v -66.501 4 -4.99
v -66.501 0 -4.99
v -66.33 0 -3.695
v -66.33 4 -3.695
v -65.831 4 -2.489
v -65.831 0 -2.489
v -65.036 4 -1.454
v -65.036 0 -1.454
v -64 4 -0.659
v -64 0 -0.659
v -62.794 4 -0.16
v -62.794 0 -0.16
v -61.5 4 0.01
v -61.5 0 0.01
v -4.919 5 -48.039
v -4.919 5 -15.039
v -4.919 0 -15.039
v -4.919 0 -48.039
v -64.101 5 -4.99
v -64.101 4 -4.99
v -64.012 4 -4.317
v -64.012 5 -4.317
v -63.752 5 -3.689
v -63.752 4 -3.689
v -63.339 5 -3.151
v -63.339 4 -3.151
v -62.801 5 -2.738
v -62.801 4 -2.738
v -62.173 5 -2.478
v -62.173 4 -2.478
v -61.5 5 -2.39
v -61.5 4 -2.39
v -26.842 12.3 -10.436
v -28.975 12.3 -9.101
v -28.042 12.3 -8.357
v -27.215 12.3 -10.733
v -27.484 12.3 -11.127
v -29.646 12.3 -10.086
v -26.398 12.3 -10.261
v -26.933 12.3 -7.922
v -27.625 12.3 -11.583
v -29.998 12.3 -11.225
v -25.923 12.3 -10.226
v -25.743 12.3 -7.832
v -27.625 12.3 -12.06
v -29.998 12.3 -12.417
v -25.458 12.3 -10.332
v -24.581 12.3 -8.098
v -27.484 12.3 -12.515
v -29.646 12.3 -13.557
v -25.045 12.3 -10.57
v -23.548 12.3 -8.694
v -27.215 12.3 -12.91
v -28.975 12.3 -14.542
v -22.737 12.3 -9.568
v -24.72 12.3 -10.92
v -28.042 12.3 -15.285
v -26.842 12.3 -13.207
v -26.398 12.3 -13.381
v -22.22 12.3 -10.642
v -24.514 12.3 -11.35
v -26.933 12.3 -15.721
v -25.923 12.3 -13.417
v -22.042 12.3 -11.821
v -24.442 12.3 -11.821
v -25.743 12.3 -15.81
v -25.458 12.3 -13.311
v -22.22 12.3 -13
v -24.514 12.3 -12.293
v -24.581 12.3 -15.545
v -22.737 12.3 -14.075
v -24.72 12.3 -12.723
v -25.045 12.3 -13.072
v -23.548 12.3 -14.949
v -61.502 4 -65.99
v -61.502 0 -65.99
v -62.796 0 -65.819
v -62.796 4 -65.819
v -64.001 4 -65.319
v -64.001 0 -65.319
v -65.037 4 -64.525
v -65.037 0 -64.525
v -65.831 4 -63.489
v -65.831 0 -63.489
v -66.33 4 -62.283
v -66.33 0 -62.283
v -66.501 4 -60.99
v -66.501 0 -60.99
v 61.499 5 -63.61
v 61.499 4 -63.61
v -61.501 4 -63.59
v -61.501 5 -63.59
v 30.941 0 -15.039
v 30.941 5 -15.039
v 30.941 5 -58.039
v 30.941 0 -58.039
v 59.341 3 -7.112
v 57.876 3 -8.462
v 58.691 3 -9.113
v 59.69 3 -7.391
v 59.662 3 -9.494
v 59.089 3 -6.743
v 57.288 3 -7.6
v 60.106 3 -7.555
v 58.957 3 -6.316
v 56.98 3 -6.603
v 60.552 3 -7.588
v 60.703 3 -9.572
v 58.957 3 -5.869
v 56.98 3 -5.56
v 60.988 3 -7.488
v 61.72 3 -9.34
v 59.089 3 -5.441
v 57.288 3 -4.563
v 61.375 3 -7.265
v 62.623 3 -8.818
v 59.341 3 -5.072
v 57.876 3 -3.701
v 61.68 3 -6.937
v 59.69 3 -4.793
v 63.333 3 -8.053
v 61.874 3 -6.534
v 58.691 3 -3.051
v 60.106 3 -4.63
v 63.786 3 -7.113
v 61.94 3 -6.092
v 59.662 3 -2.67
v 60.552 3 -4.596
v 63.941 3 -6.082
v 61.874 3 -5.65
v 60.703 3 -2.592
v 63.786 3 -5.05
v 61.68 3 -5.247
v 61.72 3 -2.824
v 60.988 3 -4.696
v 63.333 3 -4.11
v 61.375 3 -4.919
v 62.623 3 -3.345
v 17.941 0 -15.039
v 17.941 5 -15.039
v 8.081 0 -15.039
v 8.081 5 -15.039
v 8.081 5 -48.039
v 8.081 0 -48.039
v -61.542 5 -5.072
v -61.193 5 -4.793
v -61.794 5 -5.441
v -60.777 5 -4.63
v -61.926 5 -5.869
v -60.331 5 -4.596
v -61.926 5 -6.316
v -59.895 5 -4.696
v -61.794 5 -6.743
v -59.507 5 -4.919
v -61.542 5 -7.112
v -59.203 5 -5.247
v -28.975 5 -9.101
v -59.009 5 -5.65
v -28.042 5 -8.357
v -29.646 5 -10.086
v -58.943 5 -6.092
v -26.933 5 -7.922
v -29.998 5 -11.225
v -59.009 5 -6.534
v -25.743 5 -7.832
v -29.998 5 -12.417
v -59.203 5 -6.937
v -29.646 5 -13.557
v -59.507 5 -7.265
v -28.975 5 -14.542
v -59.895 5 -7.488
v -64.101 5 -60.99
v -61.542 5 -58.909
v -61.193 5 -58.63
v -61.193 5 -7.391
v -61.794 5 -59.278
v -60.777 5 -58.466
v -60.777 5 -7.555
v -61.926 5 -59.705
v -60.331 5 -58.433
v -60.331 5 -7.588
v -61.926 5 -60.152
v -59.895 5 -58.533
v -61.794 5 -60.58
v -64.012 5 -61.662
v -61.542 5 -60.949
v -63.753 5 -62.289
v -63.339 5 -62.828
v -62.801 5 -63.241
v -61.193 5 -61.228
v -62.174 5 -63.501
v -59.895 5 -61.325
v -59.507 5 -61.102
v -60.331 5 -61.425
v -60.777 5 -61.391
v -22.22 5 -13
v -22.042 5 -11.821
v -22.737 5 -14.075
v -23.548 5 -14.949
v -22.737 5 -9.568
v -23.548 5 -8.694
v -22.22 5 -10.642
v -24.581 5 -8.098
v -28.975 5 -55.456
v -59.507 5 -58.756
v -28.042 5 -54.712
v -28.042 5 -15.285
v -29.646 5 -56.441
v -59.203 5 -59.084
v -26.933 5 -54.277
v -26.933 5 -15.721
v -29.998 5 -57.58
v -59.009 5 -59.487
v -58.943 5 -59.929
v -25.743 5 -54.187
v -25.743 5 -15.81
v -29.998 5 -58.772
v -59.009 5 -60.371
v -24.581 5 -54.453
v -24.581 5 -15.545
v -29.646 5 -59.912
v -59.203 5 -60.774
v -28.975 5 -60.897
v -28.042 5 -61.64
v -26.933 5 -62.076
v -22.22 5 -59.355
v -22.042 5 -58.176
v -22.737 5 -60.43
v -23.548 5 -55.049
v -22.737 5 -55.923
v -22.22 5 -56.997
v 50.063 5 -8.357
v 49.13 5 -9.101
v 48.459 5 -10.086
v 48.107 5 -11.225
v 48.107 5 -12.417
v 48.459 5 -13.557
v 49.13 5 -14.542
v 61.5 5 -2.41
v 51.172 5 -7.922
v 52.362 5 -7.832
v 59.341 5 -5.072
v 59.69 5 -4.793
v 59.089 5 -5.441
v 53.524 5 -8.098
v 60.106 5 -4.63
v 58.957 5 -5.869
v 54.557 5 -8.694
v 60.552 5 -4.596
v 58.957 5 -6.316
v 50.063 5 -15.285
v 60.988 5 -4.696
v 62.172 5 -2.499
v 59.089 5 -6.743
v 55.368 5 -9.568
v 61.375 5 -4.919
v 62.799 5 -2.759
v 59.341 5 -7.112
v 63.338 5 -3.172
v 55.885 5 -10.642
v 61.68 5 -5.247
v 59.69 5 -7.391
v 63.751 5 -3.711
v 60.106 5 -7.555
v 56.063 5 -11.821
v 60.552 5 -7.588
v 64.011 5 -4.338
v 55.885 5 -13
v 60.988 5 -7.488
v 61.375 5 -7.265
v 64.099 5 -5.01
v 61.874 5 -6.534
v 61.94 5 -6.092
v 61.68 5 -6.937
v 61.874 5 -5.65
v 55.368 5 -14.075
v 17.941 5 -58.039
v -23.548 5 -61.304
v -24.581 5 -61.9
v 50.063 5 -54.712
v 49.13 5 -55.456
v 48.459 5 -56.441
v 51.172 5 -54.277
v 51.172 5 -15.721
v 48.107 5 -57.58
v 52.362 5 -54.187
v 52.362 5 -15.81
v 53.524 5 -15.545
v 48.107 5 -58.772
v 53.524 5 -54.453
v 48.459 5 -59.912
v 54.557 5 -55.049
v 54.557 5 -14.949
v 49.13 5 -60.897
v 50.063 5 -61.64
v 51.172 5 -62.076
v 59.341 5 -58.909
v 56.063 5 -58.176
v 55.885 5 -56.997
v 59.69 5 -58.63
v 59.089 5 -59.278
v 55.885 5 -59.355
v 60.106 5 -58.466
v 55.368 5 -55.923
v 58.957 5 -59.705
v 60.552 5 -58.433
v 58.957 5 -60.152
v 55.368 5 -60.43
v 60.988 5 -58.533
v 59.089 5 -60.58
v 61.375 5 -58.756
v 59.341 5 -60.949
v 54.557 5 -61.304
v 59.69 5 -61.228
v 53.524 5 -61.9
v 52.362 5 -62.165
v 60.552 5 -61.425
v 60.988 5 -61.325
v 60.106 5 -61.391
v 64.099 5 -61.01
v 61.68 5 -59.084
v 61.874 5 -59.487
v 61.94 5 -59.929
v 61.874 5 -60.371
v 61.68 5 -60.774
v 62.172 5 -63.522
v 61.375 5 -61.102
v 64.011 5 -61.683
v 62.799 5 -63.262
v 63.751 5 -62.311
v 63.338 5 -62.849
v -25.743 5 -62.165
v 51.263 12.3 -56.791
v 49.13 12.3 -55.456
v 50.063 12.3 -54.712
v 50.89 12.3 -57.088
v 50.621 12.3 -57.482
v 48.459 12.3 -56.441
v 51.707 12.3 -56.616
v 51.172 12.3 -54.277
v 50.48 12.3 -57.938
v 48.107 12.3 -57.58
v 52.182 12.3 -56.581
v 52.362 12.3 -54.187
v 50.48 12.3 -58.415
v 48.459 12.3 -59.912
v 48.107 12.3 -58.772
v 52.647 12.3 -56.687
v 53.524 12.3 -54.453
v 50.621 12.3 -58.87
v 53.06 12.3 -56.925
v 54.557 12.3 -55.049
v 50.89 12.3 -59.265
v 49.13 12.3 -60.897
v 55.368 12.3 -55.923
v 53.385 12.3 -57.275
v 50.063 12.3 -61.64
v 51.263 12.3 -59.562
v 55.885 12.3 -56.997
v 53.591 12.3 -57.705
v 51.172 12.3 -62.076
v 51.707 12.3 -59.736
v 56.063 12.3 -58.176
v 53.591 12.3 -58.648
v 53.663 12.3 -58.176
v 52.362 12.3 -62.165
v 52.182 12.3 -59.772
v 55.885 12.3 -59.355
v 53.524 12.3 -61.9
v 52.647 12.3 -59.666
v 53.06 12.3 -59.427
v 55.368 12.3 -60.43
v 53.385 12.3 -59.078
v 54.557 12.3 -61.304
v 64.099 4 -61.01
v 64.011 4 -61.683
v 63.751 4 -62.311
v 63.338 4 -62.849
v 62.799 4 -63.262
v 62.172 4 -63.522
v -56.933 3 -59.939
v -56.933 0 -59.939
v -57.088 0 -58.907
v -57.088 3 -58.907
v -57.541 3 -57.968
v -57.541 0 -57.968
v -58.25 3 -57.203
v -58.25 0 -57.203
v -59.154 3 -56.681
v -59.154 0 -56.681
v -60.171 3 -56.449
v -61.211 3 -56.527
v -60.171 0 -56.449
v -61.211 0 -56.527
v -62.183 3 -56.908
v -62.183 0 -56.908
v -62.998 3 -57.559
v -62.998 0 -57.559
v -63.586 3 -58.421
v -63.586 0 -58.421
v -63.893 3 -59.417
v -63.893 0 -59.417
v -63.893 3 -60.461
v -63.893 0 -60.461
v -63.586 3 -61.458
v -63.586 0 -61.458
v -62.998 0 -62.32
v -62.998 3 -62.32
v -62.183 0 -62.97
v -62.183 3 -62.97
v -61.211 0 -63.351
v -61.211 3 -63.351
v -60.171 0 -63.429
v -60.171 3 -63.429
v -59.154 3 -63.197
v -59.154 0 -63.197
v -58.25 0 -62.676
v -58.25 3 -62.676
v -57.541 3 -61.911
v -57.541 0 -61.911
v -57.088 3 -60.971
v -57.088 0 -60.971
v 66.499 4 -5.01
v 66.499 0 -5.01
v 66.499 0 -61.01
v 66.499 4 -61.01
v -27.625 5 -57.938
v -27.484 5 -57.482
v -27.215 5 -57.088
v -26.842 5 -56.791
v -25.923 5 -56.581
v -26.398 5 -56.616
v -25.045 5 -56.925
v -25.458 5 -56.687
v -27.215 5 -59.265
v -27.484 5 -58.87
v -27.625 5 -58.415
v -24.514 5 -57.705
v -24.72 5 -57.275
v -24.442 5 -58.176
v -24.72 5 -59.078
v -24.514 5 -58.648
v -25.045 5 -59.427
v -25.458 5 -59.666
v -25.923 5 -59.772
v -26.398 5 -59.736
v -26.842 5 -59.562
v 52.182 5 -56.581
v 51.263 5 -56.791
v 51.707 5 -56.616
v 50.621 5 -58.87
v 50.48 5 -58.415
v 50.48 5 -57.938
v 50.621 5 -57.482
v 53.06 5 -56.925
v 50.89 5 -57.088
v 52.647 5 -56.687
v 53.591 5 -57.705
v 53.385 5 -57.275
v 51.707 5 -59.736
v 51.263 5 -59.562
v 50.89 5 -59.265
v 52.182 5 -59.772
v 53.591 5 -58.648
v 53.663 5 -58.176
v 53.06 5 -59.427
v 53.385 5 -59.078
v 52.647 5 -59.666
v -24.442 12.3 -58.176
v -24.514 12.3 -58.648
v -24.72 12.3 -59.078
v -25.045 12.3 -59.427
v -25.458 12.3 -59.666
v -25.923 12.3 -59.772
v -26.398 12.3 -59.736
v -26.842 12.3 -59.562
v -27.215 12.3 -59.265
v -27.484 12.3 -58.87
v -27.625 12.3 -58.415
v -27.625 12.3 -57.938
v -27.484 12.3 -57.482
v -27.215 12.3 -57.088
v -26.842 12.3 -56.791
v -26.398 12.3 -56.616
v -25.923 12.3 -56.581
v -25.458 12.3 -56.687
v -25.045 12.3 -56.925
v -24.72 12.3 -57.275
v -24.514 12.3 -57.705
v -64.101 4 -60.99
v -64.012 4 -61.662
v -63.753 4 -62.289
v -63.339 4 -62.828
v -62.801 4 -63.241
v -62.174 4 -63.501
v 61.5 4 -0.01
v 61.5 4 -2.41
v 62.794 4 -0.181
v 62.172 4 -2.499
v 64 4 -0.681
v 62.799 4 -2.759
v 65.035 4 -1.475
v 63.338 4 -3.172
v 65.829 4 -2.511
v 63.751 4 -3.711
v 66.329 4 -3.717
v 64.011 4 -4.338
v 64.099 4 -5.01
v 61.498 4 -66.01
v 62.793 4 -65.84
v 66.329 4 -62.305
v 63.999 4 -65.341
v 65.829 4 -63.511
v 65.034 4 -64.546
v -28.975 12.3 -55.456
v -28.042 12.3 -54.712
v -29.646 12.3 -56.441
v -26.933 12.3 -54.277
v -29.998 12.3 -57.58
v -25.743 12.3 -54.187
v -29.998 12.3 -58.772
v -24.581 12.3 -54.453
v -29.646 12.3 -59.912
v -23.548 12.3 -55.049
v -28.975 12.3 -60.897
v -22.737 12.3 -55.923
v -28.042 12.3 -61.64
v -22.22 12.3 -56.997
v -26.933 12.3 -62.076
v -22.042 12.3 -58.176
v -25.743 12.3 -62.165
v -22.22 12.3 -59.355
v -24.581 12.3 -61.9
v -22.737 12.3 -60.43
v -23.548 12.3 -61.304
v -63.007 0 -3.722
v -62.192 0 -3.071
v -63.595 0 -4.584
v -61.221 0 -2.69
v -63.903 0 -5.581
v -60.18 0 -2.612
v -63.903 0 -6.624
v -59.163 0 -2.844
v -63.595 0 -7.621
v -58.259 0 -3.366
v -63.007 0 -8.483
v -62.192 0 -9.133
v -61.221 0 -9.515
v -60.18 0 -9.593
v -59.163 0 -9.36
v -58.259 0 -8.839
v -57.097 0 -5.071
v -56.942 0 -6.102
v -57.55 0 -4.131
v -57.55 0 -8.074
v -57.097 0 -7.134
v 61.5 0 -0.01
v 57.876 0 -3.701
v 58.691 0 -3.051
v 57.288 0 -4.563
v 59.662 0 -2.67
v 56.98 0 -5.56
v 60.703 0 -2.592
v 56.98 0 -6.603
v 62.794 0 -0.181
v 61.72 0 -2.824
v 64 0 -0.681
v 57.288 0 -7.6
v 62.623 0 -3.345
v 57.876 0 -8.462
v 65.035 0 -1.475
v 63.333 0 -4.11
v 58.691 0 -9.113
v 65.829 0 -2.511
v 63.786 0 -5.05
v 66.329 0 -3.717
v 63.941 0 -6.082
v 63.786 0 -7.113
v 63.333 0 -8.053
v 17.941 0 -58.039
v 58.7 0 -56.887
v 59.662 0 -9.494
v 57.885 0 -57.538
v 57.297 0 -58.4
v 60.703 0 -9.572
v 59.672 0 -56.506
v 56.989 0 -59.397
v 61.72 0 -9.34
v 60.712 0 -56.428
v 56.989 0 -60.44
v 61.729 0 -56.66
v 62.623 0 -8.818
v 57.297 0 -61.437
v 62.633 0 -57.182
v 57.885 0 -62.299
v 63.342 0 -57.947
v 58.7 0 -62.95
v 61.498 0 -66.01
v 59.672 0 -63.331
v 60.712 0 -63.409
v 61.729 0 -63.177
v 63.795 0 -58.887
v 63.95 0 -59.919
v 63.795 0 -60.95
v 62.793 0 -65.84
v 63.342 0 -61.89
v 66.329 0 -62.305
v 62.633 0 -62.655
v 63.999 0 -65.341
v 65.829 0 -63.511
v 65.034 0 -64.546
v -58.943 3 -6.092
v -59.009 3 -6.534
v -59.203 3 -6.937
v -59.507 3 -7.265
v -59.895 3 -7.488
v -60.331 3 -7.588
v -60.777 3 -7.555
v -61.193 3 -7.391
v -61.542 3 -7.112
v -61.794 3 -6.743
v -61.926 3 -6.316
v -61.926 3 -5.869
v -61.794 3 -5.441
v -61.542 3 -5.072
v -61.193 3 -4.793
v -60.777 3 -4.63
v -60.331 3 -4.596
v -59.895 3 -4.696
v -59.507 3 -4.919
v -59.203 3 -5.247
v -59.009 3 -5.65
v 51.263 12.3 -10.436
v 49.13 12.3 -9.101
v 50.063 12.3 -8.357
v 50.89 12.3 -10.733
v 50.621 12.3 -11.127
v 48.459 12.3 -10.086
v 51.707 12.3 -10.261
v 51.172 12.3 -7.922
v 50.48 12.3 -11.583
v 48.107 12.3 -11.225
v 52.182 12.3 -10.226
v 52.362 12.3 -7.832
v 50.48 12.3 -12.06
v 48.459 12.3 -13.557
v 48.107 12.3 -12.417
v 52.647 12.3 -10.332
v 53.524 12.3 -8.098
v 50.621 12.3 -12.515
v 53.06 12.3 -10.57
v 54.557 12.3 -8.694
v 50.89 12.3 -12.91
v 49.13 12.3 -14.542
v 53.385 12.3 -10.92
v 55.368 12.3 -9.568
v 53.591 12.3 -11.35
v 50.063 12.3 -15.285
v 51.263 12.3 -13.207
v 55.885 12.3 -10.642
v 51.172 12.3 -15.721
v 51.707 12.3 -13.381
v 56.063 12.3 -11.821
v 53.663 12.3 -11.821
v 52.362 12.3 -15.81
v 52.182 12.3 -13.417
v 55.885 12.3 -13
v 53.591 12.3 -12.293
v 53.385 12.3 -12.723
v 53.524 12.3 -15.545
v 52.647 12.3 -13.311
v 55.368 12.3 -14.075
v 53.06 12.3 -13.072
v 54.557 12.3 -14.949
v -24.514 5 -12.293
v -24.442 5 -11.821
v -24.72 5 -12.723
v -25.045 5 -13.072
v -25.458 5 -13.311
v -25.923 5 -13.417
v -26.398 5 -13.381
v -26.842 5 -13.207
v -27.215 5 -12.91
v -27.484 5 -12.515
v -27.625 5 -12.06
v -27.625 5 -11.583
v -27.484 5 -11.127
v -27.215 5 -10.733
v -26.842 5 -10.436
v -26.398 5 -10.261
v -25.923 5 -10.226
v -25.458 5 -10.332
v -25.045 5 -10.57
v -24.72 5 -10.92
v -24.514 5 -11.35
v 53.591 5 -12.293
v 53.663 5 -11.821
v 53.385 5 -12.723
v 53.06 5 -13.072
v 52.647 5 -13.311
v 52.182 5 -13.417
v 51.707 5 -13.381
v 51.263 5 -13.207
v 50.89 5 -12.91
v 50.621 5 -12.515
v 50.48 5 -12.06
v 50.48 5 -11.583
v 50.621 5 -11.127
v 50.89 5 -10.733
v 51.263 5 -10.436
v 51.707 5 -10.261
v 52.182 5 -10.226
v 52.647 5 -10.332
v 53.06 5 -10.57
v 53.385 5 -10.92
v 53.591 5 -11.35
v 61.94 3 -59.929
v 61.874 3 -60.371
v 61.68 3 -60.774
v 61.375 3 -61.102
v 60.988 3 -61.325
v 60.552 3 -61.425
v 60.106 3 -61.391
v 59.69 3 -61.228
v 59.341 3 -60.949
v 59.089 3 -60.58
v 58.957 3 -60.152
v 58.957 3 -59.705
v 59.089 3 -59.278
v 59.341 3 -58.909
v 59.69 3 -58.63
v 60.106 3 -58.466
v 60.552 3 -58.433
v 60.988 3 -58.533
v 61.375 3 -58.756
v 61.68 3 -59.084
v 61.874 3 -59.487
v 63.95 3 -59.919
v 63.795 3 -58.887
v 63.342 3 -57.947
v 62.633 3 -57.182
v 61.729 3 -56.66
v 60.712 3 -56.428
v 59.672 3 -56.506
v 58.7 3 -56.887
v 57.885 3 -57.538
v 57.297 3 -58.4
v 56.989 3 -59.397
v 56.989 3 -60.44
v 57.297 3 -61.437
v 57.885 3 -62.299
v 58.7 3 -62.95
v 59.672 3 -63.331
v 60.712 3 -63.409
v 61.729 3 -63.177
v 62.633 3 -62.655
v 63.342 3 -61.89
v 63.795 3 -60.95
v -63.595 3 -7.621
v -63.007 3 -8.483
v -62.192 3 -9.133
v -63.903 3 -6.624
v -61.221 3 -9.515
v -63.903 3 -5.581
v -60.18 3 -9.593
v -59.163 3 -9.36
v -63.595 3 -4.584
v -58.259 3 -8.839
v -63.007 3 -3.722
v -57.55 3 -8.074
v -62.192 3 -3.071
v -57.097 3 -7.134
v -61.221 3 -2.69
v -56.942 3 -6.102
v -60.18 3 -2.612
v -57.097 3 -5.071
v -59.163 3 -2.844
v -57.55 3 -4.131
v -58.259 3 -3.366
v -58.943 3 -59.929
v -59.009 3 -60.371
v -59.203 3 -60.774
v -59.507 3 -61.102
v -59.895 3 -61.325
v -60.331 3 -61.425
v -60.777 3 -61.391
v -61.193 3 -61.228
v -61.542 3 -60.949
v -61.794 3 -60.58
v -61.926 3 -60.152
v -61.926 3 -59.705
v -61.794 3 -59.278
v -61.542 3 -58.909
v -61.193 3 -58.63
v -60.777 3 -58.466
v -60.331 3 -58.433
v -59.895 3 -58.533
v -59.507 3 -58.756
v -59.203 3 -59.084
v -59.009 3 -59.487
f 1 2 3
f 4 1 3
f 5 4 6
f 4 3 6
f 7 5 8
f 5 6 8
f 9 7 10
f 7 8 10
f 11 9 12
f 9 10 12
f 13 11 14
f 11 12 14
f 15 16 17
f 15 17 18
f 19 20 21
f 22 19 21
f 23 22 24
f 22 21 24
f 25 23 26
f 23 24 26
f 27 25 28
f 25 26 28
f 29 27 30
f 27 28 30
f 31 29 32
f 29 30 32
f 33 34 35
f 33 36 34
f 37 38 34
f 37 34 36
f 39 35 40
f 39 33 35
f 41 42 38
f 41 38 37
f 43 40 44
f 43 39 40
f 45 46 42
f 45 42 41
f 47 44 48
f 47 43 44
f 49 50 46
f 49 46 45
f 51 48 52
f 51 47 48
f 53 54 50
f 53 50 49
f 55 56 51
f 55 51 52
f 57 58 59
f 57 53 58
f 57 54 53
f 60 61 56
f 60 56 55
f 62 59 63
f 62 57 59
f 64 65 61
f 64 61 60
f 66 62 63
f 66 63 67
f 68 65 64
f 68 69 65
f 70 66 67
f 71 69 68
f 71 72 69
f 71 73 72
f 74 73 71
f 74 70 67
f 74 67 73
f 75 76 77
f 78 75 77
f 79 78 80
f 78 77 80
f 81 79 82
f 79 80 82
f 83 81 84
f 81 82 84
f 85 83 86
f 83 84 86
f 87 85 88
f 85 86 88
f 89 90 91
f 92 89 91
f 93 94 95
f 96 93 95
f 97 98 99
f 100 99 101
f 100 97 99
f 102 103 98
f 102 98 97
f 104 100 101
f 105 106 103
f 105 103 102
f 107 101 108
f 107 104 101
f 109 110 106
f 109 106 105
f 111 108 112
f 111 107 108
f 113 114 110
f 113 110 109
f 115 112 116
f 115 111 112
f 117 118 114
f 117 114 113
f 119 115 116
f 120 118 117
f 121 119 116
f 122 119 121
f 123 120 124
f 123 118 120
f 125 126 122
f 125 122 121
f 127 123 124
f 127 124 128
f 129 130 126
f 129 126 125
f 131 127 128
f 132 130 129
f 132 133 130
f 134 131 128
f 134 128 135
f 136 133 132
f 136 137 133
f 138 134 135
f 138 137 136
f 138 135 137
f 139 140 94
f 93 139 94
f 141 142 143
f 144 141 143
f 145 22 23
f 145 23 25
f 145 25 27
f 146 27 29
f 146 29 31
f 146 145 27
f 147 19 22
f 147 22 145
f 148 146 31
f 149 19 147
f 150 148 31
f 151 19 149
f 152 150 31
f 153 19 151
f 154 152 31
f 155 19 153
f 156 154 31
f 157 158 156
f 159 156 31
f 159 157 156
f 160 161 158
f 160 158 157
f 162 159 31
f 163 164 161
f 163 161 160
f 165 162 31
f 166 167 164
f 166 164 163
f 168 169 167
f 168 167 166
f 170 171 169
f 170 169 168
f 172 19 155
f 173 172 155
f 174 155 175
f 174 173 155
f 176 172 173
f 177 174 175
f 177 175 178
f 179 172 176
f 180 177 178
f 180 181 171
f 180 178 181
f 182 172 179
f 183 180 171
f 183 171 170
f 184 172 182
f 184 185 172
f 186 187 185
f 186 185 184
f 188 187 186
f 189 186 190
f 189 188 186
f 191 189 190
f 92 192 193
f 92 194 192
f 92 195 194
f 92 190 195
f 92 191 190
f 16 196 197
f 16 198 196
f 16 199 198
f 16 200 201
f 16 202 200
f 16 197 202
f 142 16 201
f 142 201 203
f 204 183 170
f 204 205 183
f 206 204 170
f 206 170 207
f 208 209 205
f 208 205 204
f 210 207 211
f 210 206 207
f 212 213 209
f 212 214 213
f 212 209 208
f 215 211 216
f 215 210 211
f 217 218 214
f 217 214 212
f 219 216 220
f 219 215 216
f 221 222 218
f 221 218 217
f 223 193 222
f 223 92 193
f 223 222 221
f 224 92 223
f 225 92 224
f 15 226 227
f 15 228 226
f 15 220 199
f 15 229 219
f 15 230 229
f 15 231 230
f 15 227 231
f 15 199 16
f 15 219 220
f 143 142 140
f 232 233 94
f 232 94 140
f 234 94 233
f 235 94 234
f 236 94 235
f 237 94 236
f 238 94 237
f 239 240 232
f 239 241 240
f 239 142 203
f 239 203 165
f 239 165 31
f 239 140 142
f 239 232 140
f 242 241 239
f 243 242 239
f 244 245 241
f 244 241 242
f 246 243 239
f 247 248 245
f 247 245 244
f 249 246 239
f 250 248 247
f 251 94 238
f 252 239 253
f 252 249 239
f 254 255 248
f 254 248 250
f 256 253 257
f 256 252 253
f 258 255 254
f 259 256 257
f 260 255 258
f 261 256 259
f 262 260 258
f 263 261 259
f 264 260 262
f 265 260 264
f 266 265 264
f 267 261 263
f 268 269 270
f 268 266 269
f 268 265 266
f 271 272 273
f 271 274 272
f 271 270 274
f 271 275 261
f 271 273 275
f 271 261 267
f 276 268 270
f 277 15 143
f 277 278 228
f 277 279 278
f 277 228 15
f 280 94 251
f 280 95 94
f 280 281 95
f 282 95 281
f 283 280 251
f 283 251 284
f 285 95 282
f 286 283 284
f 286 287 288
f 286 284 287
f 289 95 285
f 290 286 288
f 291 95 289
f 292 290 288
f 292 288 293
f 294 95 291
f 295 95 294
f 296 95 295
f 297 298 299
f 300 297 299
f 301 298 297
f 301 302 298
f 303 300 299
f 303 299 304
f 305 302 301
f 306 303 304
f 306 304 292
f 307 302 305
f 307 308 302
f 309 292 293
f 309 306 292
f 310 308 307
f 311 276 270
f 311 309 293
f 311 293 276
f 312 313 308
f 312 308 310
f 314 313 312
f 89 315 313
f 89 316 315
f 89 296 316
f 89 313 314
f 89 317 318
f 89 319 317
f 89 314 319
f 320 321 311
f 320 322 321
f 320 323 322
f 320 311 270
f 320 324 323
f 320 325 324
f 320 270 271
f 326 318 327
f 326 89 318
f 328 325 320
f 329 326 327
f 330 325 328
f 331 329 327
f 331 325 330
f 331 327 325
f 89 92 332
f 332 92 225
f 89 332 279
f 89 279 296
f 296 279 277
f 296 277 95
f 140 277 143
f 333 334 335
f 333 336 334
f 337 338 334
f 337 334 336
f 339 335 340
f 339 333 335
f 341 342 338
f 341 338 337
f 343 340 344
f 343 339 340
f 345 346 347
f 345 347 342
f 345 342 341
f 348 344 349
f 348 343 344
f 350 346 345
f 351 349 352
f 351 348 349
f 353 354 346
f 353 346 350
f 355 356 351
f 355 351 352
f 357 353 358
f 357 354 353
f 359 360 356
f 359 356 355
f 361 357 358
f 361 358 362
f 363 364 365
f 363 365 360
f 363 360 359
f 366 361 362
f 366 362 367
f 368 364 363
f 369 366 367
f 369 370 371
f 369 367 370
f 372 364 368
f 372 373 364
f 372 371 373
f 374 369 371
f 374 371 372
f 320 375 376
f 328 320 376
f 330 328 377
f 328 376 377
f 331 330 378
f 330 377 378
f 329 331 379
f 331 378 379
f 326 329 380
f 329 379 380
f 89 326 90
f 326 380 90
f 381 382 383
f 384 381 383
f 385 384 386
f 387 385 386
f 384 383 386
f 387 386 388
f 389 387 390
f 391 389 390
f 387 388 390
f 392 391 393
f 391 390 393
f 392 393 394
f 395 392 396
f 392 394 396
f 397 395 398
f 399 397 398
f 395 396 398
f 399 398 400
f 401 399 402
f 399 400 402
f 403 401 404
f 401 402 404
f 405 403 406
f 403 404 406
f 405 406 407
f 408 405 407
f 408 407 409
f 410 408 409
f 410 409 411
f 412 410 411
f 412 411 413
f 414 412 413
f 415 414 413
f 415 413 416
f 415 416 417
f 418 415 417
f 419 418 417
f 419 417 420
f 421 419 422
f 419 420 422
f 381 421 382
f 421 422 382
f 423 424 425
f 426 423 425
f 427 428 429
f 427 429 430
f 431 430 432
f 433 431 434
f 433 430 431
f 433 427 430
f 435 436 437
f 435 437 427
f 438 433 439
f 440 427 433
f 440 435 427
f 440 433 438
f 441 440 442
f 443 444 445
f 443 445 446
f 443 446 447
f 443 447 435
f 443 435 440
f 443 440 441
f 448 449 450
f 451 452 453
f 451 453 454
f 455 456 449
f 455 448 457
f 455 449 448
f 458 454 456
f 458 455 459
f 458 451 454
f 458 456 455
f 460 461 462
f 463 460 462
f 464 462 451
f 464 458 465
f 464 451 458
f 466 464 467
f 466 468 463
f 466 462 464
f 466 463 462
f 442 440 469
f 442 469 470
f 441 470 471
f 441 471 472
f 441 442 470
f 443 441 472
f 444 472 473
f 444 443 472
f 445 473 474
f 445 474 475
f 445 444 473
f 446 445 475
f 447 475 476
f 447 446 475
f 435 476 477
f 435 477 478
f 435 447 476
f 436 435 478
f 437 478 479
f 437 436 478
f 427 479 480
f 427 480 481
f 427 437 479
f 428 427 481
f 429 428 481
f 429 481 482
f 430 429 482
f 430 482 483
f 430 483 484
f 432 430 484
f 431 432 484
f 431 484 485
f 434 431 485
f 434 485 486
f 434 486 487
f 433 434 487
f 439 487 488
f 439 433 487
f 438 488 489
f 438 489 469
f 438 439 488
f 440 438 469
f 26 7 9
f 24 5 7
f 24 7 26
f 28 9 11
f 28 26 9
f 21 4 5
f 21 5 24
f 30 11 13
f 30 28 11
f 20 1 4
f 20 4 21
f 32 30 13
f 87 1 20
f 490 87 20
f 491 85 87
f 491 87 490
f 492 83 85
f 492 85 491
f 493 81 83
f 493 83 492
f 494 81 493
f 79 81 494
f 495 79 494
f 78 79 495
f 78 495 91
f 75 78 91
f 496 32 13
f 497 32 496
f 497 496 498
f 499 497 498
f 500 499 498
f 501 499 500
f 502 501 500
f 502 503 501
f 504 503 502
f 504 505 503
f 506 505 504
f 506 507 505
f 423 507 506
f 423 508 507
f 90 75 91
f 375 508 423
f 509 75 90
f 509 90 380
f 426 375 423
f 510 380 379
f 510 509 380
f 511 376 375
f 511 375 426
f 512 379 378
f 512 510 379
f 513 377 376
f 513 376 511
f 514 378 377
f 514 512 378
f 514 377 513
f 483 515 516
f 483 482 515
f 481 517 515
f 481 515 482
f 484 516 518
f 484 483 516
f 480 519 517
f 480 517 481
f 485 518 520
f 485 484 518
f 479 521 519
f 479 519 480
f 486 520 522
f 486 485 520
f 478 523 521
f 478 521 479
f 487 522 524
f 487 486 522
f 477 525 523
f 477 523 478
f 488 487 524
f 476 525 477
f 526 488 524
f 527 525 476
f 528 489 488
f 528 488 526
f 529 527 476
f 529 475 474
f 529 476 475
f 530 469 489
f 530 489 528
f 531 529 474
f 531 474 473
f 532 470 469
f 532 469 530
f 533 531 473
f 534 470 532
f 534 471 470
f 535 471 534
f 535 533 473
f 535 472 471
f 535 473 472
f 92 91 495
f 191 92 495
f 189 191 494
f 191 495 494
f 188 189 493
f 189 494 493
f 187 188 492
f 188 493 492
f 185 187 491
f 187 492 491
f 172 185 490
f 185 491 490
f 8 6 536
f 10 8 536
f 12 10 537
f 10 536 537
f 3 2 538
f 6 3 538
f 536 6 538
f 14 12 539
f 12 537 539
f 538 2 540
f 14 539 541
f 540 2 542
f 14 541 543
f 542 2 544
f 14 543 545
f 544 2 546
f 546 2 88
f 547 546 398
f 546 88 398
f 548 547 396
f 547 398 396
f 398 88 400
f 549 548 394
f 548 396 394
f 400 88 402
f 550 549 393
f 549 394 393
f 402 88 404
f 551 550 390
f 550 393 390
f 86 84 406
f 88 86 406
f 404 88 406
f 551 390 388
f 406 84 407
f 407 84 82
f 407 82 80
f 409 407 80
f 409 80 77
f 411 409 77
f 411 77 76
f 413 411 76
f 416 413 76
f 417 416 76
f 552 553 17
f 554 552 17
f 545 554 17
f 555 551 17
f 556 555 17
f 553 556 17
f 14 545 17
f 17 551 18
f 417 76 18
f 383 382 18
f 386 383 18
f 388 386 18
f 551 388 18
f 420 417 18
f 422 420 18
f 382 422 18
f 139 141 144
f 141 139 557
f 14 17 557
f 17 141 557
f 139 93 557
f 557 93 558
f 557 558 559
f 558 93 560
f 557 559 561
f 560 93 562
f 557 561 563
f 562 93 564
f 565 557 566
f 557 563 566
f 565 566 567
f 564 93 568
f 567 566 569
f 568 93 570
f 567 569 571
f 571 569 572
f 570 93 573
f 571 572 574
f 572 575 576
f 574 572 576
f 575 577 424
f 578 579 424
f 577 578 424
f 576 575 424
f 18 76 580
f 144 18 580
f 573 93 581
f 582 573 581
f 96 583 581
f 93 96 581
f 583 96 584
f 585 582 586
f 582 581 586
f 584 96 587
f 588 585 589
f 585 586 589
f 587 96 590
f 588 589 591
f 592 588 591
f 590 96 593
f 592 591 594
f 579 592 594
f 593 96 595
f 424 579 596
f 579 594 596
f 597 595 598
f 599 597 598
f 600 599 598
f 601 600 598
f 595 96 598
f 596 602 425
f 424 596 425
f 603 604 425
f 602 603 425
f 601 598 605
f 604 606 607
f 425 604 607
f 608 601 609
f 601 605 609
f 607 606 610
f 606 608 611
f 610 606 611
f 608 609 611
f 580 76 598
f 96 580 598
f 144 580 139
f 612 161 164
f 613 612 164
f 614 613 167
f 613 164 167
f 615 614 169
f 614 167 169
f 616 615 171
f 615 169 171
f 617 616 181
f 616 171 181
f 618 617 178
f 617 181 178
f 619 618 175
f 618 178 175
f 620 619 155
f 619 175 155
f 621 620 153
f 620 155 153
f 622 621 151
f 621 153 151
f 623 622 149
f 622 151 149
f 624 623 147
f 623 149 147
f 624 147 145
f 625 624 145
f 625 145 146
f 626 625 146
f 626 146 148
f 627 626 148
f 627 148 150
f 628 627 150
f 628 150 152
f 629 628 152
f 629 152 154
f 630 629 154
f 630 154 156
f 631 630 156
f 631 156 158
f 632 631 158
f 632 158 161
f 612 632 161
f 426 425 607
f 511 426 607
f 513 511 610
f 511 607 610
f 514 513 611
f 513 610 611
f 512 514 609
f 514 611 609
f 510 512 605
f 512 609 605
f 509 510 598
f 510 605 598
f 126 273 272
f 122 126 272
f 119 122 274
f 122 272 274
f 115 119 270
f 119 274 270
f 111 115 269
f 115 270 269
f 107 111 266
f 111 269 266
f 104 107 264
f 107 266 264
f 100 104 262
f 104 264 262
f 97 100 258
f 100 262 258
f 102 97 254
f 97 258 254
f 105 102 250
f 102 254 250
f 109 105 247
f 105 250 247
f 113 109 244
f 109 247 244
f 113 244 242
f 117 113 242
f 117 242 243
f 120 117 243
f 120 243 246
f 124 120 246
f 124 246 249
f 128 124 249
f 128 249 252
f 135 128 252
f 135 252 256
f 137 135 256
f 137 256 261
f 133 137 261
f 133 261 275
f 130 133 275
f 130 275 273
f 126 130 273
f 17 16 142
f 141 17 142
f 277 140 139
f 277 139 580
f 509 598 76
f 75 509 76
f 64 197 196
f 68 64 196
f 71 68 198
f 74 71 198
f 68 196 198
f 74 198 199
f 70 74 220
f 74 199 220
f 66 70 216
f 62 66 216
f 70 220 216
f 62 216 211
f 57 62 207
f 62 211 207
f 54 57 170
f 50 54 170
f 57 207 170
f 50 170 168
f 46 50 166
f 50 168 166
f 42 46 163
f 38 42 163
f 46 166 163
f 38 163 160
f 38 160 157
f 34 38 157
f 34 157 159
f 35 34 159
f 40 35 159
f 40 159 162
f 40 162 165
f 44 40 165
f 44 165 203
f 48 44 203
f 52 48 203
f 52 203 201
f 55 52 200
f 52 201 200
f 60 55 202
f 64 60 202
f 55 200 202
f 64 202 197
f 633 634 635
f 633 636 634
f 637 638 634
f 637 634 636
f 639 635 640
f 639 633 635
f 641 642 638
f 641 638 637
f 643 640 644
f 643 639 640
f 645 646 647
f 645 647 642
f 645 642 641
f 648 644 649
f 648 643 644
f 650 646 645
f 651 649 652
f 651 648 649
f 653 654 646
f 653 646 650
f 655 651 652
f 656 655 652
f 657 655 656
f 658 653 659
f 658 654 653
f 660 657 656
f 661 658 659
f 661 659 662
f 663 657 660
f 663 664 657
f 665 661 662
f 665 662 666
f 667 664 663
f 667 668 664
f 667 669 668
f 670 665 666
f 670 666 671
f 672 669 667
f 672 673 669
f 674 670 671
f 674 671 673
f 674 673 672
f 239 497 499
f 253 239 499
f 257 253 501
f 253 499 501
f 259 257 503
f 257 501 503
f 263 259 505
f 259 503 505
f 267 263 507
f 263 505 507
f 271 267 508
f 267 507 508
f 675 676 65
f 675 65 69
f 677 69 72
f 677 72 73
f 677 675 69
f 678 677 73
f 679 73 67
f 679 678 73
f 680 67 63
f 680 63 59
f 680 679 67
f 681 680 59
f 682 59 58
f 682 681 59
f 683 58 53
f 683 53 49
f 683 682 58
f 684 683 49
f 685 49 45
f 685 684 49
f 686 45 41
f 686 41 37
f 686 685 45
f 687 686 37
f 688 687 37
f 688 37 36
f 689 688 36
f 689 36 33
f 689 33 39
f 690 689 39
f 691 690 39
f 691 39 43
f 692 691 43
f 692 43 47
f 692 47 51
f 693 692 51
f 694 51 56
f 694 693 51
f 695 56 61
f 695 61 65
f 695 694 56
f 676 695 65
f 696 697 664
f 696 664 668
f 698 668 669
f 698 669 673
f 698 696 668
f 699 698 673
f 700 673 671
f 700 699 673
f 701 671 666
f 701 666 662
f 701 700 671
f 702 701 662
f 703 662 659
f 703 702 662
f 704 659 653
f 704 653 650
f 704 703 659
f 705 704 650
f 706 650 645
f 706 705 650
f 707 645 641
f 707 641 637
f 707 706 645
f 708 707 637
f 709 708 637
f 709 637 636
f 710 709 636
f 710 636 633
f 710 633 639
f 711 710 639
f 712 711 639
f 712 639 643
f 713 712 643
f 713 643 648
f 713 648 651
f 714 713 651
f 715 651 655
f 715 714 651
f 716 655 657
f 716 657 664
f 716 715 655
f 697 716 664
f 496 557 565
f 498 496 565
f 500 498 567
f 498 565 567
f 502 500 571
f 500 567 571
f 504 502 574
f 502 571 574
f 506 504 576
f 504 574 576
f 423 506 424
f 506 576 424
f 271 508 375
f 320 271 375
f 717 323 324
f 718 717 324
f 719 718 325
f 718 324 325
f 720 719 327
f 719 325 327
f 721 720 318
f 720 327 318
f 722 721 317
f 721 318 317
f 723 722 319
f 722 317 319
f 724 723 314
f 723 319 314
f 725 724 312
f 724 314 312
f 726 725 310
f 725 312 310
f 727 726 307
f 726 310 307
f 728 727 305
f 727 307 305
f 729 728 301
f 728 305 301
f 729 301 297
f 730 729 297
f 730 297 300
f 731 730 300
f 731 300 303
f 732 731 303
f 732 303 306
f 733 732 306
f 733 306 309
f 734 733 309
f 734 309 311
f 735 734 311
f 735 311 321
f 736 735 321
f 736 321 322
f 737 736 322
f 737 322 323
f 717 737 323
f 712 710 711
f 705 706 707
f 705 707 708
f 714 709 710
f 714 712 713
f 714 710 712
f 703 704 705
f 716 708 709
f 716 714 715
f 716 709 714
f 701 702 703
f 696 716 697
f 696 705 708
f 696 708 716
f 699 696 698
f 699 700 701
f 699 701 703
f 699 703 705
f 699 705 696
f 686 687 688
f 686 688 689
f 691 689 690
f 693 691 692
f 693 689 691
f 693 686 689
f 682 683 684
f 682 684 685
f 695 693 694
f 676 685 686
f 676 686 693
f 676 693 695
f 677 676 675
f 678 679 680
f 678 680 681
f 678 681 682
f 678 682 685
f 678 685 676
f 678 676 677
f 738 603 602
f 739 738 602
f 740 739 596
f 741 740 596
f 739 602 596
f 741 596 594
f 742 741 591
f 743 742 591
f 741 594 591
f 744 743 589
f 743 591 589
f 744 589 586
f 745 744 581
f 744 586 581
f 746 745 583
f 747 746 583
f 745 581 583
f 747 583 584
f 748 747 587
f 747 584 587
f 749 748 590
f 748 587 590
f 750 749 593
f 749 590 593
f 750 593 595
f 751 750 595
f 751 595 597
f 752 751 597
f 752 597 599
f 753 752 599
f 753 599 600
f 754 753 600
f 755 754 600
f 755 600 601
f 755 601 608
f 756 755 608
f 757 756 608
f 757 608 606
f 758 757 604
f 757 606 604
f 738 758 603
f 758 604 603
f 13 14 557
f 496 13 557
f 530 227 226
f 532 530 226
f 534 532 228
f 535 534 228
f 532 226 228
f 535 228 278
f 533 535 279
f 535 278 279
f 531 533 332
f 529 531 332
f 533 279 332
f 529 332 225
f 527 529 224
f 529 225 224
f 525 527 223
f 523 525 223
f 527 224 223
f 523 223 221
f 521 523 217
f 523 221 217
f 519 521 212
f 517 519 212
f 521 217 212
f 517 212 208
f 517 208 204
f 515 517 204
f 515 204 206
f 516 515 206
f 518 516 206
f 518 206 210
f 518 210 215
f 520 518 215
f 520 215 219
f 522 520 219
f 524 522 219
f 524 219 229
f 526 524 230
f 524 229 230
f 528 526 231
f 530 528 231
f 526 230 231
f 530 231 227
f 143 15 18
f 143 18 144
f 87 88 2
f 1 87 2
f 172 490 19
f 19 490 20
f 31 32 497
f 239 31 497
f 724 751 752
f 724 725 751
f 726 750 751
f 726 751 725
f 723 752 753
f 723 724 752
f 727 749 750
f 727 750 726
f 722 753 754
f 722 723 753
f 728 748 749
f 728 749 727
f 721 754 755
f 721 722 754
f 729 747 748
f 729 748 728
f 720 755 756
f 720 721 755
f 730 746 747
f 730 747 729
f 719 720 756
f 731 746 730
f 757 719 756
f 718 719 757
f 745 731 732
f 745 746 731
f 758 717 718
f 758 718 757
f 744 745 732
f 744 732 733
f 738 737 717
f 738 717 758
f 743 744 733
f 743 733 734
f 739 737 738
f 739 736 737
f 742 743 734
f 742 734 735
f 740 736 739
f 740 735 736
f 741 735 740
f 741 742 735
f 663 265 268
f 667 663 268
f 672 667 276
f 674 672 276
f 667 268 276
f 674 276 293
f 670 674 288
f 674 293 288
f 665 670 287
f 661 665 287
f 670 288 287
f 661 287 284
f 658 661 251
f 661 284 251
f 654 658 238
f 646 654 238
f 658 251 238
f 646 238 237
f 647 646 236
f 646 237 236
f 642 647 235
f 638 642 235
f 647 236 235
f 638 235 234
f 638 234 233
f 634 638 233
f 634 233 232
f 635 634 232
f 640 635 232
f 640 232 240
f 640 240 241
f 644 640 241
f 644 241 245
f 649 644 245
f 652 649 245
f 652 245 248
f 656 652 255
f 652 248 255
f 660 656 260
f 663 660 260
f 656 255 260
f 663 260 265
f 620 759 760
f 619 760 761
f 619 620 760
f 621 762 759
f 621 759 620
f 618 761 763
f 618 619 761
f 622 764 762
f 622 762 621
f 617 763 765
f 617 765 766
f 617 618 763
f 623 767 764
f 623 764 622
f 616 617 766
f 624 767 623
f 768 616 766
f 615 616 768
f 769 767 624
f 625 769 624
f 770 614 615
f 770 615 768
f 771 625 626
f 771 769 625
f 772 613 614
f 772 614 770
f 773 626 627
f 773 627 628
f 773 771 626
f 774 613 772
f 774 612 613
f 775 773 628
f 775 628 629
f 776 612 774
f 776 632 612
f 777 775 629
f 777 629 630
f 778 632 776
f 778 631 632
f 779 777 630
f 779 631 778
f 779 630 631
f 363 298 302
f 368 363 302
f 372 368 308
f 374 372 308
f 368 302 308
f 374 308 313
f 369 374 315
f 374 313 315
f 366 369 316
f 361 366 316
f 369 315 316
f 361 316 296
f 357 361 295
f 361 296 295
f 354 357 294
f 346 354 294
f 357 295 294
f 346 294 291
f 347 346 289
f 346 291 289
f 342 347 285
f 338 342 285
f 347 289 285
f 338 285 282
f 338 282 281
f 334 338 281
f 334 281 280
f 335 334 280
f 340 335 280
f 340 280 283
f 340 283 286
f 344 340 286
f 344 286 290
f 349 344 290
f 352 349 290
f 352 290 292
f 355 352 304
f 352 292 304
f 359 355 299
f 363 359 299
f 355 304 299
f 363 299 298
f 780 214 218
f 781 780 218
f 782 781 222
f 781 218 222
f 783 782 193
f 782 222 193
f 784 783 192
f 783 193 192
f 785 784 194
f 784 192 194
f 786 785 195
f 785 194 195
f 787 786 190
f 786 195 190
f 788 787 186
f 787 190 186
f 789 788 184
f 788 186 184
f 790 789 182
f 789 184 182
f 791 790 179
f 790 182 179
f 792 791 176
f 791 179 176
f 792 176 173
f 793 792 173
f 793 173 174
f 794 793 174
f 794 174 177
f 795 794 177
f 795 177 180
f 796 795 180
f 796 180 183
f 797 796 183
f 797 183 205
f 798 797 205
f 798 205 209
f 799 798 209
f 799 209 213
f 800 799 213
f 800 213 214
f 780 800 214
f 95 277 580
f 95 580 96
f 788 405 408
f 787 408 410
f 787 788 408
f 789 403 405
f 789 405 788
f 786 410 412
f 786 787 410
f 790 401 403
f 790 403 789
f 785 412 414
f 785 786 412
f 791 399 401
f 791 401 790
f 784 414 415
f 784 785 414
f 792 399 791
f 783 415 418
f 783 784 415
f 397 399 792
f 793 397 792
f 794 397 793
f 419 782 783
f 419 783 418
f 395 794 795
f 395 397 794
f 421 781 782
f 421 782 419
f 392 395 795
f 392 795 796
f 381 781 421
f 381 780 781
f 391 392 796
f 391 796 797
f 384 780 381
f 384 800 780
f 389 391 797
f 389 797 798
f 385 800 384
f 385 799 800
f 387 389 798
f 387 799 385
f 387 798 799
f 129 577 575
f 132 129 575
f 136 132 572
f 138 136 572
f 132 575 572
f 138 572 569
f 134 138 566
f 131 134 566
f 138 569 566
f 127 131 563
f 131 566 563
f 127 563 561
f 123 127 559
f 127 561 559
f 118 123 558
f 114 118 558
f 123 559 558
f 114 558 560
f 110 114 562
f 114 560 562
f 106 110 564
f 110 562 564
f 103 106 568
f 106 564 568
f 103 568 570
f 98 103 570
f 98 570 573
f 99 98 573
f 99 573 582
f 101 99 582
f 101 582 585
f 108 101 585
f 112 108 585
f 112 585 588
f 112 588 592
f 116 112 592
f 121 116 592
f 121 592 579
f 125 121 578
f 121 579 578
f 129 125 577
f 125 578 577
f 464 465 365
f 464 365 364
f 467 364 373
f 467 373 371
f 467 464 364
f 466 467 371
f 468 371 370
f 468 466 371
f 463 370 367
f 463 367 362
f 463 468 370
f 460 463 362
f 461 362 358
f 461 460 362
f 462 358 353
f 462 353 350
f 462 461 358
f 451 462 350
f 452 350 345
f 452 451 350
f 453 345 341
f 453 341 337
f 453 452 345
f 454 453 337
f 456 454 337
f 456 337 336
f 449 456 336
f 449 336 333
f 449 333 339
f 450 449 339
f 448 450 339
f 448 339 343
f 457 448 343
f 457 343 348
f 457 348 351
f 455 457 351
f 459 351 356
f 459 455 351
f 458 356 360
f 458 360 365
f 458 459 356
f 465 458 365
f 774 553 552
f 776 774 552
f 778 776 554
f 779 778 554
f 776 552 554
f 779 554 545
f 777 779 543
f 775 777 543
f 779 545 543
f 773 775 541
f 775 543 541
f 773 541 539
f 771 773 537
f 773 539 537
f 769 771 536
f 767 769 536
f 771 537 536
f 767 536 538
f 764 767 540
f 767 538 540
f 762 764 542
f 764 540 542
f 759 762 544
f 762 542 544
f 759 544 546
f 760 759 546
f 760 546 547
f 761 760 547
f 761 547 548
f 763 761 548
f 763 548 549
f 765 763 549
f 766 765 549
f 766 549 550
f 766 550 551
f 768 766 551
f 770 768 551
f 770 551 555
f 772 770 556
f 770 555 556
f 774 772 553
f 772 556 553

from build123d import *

# Parameters (mm, degrees)
EXTRUDE_1_DEPTH     = 4
EXTRUDE_2_DEPTH     = 1
SKETCH_3_W          = 13
SKETCH_3_H          = 43
SKETCH_3_H_2        = 33
CUT_EXTRUDE_1_DEPTH = 6
SKETCH_4_R          = 4
SKETCH_4_R_2        = 1.6
EXTRUDE_4_DEPTH     = 7.3
SKETCH_5_R          = 1.5
CUT_EXTRUDE_2_DEPTH = 7.3
SKETCH_6_R          = 3.5
CUT_EXTRUDE_3_DEPTH = 3


with BuildPart() as part:
    # 스케치1 → 보스-돌출1 (new body)
    with BuildSketch(Plane(origin=(0, 0, 0), x_dir=(1, 0, 0), z_dir=(0, 1, 0))):
        with BuildLine():
            Line((61.498388188, 66.010476517), (-61.501611812, 65.989522963))
            ThreePointArc((-61.501611812, 65.989522963), (-65.036624731, 64.524771992), (-66.500805906, 60.989523028))
            Line((-66.500805906, 60.989523028), (-66.500805906, 4.989523158))
            ThreePointArc((-66.500805906, 4.989523158), (-65.03605487, 1.453704333), (-61.5, -0.010476777))
            Line((-61.5, -0.010476777), (61.5, 0.010476777))
            ThreePointArc((61.5, 0.010476777), (65.035012919, 1.475227749), (66.499194094, 5.010476712))
            Line((66.499194094, 5.010476712), (66.499194094, 61.010476582))
            ThreePointArc((66.499194094, 61.010476582), (65.034443058, 64.546295408), (61.498388188, 66.010476517))
        make_face()
    extrude(amount=EXTRUDE_1_DEPTH)

    # 스케치2 → 보스-돌출2 (add)
    with BuildSketch(Plane(origin=(0, 4, 0), x_dir=(1, 0, 0), z_dir=(0, 1, 0))):
        with BuildLine():
            Line((61.498751287, 63.610473876), (-61.501248713, 63.589525677))
            ThreePointArc((-61.501248713, 63.589525677), (-63.339440086, 62.827846783), (-64.100805906, 60.989525714))
            Line((-64.100805906, 60.989525714), (-64.100805906, 4.989525834))
            ThreePointArc((-64.100805906, 4.989525834), (-63.339126974, 3.150891653), (-61.500363098, 2.389525871))
            Line((-61.500363098, 2.389525871), (61.499636902, 2.410474071))
            ThreePointArc((61.499636902, 2.410474071), (63.337828275, 3.172152965), (64.099194094, 5.010474033))
            Line((64.099194094, 5.010474033), (64.099194094, 61.010473914))
            ThreePointArc((64.099194094, 61.010473914), (63.337515162, 62.849108095), (61.498751287, 63.610473876))
        make_face()
    extrude(amount=EXTRUDE_2_DEPTH)

    # 스케치3 → 컷-돌출1 (cut, through all)
    with BuildSketch(Plane(origin=(0, 5, 0), x_dir=(1, 0, 0), z_dir=(0, 1, 0))):
        with Locations((24.440725111, 36.53850122)):
            Rectangle(SKETCH_3_W, SKETCH_3_H)
        with Locations((1.580725111, 31.53850122)):
            Rectangle(SKETCH_3_W, SKETCH_3_H_2)
    extrude(amount=-CUT_EXTRUDE_1_DEPTH, mode=Mode.SUBTRACT)

    # 스케치4 → 보스-돌출4 (add)
    with BuildSketch(Plane(origin=(0, 5, 0), x_dir=(1, 0, 0), z_dir=(0, 1, 0))):
        with Locations((-26.042417718, 58.176282553)):
            Circle(SKETCH_4_R)
        with Locations((-26.042417718, 58.176282553)):
            Circle(SKETCH_4_R_2, mode=Mode.SUBTRACT)
        with Locations((52.062582282, 58.176282553)):
            Circle(SKETCH_4_R)
        with Locations((52.062582282, 58.176282553)):
            Circle(SKETCH_4_R_2, mode=Mode.SUBTRACT)
        with Locations((-26.042417718, 11.821282553)):
            Circle(SKETCH_4_R)
        with Locations((-26.042417718, 11.821282553)):
            Circle(SKETCH_4_R_2, mode=Mode.SUBTRACT)
        with Locations((52.062582282, 11.821282553)):
            Circle(SKETCH_4_R)
        with Locations((52.062582282, 11.821282553)):
            Circle(SKETCH_4_R_2, mode=Mode.SUBTRACT)
    extrude(amount=EXTRUDE_4_DEPTH)

    # 스케치5 → 컷-돌출2 (cut)
    with BuildSketch(Plane(origin=(0, 5, 0), x_dir=(1, 0, 0), z_dir=(0, 1, 0))):
        with Locations((60.440145734, 59.928842317)):
            Circle(SKETCH_5_R)
        with Locations((60.440145734, 6.092110978)):
            Circle(SKETCH_5_R)
        with Locations((-60.442726529, 59.928842317)):
            Circle(SKETCH_5_R)
        with Locations((-60.442726529, 6.092110978)):
            Circle(SKETCH_5_R)
    extrude(amount=-CUT_EXTRUDE_2_DEPTH, mode=Mode.SUBTRACT)

    # 스케치6 → 컷-돌출3 (cut)
    with BuildSketch(Plane.XZ):
        with Locations((60.450353981, -59.918545221)):
            Circle(SKETCH_6_R)
        with Locations((60.441182673, -6.081814663)):
            Circle(SKETCH_6_R)
        with Locations((-60.432516528, -59.939138113)):
            Circle(SKETCH_6_R)
        with Locations((-60.441687836, -6.102407556)):
            Circle(SKETCH_6_R)
    extrude(amount=-CUT_EXTRUDE_3_DEPTH, mode=Mode.SUBTRACT)


solid = part.part
